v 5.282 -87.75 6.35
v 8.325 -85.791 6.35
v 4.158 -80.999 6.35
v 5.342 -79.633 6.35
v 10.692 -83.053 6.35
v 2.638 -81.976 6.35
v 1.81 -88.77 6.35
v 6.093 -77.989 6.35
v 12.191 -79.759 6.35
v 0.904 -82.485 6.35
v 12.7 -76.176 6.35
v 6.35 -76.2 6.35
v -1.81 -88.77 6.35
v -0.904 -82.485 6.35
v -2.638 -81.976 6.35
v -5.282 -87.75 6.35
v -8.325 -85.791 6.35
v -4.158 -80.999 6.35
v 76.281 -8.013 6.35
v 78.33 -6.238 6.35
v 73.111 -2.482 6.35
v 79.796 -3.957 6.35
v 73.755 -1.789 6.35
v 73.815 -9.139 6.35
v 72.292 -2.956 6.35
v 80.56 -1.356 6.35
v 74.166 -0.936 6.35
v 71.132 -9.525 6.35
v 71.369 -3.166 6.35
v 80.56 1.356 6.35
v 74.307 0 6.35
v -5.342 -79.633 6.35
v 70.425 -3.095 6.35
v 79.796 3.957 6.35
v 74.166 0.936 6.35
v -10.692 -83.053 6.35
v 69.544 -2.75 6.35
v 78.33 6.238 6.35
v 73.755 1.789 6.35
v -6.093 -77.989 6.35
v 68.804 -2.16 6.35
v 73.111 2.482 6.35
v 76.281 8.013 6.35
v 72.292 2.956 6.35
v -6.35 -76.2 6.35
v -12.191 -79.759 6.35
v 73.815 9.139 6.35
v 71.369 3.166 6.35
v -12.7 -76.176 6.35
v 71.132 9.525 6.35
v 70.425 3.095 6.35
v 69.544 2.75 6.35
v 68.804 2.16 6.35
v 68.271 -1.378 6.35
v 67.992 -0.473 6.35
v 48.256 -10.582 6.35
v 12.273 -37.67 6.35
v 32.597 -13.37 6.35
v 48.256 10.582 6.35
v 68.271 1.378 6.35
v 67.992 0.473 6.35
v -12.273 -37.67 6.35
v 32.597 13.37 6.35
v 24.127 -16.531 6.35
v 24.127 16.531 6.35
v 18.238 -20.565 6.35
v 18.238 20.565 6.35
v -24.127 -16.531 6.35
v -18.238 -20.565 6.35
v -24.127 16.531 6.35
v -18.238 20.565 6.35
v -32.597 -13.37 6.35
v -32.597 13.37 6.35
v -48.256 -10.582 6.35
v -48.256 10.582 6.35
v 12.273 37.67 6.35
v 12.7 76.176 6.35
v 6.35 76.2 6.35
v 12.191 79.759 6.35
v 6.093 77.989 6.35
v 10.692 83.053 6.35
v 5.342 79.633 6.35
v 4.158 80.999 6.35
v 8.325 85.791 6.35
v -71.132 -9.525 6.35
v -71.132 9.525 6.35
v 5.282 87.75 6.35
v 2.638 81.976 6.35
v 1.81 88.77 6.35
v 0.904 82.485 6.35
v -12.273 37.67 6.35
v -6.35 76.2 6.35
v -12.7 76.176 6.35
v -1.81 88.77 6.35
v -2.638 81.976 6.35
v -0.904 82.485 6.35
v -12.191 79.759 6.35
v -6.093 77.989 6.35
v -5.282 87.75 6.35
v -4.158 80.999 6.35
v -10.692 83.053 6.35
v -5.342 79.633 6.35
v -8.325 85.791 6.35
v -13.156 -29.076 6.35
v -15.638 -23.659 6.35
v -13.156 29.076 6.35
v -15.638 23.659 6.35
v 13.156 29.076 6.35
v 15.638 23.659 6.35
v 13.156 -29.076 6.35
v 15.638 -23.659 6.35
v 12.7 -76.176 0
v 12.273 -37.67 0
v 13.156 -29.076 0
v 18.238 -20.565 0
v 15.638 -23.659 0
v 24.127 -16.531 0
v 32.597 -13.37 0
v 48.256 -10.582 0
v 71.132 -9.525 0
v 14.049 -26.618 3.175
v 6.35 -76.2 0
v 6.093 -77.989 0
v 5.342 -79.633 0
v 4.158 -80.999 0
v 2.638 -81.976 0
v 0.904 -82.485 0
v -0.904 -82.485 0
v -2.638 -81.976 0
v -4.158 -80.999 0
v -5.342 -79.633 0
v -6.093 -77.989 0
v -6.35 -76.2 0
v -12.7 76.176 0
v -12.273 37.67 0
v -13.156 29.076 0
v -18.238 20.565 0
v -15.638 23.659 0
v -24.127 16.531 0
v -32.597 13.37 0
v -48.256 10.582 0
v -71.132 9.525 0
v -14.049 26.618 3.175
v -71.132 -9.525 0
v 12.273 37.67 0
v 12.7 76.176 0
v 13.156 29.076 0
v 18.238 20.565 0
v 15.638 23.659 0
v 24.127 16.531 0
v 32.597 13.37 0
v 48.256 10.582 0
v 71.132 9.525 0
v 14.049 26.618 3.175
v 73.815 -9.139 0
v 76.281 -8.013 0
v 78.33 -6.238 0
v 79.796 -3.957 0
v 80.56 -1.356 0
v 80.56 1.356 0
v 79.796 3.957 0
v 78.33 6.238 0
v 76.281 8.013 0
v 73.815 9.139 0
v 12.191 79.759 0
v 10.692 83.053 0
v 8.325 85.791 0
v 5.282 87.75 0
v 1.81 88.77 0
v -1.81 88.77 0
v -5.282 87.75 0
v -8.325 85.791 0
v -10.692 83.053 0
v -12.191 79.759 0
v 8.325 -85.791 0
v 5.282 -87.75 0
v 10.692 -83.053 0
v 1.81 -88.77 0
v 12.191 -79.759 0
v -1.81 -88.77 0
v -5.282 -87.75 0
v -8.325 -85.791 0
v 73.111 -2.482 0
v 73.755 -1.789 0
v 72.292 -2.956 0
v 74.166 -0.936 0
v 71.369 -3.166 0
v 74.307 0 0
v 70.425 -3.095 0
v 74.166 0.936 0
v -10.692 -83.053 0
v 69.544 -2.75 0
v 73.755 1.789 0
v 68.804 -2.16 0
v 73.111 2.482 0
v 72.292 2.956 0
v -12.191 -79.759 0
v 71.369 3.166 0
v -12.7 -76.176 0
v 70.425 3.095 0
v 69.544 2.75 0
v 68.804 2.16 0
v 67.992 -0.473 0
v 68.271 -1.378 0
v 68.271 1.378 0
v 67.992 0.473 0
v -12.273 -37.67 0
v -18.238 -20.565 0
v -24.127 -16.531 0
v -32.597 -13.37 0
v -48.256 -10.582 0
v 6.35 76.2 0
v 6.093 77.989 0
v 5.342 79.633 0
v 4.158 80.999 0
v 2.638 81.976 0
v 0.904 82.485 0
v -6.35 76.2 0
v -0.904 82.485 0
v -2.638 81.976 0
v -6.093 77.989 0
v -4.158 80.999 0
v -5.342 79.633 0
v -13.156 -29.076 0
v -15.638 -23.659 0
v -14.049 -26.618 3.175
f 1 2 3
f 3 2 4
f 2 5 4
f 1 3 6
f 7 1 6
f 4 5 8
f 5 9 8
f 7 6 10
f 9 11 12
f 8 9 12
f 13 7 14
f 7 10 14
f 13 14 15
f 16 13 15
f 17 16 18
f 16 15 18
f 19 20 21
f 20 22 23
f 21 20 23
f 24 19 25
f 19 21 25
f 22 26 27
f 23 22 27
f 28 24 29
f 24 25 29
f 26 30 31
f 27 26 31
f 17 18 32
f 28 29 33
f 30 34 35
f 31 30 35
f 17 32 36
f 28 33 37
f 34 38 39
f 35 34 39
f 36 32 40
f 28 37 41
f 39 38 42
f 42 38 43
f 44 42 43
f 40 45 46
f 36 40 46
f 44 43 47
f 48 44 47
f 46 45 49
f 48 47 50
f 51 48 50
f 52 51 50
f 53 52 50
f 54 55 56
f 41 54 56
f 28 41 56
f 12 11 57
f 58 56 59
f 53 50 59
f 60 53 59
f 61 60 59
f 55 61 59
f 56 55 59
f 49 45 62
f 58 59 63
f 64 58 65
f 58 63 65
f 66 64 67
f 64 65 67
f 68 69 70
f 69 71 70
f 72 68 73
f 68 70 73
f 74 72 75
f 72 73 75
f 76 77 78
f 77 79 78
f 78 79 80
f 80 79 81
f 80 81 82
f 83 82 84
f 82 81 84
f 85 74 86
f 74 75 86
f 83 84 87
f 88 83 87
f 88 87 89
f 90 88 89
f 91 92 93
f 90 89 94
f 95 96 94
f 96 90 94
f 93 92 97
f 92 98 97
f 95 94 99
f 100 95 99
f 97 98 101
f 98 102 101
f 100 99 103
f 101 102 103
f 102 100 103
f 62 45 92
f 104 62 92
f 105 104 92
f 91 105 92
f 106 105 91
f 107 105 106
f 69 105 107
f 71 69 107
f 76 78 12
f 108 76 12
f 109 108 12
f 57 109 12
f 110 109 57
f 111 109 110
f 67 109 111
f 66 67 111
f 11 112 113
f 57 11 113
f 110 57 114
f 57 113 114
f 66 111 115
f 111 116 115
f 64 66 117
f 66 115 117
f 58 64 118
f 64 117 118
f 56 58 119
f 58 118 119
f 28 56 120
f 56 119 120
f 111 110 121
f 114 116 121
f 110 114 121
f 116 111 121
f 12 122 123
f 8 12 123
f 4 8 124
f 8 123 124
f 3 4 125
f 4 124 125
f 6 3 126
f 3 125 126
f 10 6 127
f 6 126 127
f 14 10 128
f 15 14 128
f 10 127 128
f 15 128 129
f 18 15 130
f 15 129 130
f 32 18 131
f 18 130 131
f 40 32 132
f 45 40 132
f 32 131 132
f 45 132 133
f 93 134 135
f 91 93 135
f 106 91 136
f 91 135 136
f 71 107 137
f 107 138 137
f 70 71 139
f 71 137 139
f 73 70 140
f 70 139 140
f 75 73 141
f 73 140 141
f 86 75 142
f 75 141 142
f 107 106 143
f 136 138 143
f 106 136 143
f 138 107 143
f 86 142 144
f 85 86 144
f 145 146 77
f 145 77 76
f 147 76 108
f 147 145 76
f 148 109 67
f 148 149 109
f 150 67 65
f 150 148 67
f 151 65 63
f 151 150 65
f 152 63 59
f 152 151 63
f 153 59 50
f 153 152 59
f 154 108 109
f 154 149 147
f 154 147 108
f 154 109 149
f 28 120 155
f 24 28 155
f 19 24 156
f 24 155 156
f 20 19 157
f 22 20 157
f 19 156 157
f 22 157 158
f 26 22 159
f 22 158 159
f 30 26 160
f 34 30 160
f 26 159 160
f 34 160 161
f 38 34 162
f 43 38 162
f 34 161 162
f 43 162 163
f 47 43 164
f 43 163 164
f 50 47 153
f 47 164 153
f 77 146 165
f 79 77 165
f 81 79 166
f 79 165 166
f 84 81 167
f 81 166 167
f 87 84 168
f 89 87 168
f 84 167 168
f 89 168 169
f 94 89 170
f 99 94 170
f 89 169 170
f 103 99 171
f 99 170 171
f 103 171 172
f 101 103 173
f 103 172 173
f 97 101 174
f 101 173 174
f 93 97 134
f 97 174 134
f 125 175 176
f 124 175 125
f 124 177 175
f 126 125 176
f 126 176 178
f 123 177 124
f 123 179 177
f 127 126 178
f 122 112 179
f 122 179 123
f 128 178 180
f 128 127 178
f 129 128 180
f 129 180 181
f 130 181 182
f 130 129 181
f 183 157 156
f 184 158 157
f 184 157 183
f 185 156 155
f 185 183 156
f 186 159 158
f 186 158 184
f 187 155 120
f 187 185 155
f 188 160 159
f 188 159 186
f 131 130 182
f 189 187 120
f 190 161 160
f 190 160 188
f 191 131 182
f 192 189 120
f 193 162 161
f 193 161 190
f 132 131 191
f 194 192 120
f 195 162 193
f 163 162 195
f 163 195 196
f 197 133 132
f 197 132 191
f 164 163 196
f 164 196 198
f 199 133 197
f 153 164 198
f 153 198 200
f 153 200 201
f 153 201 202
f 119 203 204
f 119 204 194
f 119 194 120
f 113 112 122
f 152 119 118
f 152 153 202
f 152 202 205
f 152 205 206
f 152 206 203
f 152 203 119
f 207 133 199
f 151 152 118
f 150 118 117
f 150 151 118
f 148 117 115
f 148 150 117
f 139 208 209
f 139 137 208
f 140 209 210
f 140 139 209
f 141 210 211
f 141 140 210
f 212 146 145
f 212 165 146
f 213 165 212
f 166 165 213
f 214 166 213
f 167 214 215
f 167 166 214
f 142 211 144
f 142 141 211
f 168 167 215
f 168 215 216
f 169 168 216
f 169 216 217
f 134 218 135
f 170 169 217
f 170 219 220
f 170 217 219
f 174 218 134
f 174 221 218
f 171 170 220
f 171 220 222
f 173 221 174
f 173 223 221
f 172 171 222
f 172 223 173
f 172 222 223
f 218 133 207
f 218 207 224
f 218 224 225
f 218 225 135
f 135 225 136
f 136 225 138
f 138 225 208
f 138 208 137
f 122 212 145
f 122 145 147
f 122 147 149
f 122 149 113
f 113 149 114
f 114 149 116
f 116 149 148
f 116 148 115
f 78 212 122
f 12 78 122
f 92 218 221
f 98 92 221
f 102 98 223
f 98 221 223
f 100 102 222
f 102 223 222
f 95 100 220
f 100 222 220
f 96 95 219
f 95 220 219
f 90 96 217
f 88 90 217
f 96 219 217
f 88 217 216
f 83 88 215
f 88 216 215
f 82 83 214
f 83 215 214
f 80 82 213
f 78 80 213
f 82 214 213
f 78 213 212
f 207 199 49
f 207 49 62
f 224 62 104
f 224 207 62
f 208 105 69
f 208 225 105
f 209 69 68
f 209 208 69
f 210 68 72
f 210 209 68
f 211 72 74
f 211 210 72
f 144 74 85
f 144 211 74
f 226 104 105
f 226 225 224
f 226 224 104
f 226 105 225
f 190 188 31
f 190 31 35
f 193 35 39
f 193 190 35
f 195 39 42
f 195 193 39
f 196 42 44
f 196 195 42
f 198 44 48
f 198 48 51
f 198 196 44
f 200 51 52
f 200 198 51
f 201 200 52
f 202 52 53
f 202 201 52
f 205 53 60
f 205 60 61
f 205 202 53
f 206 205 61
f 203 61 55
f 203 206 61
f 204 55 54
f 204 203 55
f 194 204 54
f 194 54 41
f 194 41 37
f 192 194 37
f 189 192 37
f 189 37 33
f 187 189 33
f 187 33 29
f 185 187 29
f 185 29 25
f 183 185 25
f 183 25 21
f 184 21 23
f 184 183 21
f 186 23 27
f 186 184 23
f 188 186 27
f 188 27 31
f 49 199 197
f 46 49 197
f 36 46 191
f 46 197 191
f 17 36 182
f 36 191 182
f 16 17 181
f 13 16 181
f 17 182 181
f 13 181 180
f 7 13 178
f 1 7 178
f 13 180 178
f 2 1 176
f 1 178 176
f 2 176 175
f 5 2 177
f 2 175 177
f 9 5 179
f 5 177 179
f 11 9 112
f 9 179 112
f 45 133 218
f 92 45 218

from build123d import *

# Parameters (mm, degrees)
F0_R     = 3.175
F1_DEPTH = 6.35


with BuildPart() as f1:
    # F0 (on Top) → F1 (new body)
    with BuildSketch(Plane.XY):
        with BuildLine():
            add(Edge.make_bspline(
                [(12.6999774132, 76.1760478683), (12.6272396661, 37.6088022986), (9.5681586268, 28.3894937776), (25.5841249437, 9.525), (71.131721139, 9.525)],
                knots=[0, 0, 0, 0, 0.4770256041, 1, 1, 1, 1], degree=3))
            ThreePointArc((12.6999774132, 76.1760478683), (0, 88.9), (-12.6999774132, 76.1760478683))
            add(Edge.make_bspline(
                [(-12.6999774132, 76.1760478683), (-12.6272396661, 37.6088022986), (-9.5681586268, 28.3894937776), (-25.5841249437, 9.525), (-71.131721139, 9.525)],
                knots=[0, 0, 0, 0, 0.4770256041, 1, 1, 1, 1], degree=3))
            Line((-71.131721139, 9.525), (-71.131721139, -9.525))
            add(Edge.make_bspline(
                [(-12.6999774132, -76.1760478683), (-12.6272396661, -37.6088022986), (-9.5681586268, -28.3894937776), (-25.5841249437, -9.525), (-71.131721139, -9.525)],
                knots=[0, 0, 0, 0, 0.4770256041, 1, 1, 1, 1], degree=3))
            ThreePointArc((-12.6999774132, -76.1760478683), (0, -88.9), (12.6999774132, -76.1760478683))
            add(Edge.make_bspline(
                [(12.6999774132, -76.1760478683), (12.6272396661, -37.6088022986), (9.5681586268, -28.3894937776), (25.5841249437, -9.525), (71.131721139, -9.525)],
                knots=[0, 0, 0, 0, 0.4770256041, 1, 1, 1, 1], degree=3))
            ThreePointArc((71.131721139, -9.525), (80.656721139, 0), (71.131721139, 9.525))
        make_face()
        with BuildLine():
            ThreePointArc((-6.35, 76.2), (0, 82.55), (6.35, 76.2))
            Line((6.35, 76.2), (6.35, -76.2))
            ThreePointArc((6.35, -76.2), (0, -82.55), (-6.35, -76.2))
            Line((-6.35, -76.2), (-6.35, 76.2))
        make_face(mode=Mode.SUBTRACT)
        with Locations((71.131721139, 0)):
            Circle(F0_R, mode=Mode.SUBTRACT)
    extrude(amount=F1_DEPTH)


solid = f1.part
